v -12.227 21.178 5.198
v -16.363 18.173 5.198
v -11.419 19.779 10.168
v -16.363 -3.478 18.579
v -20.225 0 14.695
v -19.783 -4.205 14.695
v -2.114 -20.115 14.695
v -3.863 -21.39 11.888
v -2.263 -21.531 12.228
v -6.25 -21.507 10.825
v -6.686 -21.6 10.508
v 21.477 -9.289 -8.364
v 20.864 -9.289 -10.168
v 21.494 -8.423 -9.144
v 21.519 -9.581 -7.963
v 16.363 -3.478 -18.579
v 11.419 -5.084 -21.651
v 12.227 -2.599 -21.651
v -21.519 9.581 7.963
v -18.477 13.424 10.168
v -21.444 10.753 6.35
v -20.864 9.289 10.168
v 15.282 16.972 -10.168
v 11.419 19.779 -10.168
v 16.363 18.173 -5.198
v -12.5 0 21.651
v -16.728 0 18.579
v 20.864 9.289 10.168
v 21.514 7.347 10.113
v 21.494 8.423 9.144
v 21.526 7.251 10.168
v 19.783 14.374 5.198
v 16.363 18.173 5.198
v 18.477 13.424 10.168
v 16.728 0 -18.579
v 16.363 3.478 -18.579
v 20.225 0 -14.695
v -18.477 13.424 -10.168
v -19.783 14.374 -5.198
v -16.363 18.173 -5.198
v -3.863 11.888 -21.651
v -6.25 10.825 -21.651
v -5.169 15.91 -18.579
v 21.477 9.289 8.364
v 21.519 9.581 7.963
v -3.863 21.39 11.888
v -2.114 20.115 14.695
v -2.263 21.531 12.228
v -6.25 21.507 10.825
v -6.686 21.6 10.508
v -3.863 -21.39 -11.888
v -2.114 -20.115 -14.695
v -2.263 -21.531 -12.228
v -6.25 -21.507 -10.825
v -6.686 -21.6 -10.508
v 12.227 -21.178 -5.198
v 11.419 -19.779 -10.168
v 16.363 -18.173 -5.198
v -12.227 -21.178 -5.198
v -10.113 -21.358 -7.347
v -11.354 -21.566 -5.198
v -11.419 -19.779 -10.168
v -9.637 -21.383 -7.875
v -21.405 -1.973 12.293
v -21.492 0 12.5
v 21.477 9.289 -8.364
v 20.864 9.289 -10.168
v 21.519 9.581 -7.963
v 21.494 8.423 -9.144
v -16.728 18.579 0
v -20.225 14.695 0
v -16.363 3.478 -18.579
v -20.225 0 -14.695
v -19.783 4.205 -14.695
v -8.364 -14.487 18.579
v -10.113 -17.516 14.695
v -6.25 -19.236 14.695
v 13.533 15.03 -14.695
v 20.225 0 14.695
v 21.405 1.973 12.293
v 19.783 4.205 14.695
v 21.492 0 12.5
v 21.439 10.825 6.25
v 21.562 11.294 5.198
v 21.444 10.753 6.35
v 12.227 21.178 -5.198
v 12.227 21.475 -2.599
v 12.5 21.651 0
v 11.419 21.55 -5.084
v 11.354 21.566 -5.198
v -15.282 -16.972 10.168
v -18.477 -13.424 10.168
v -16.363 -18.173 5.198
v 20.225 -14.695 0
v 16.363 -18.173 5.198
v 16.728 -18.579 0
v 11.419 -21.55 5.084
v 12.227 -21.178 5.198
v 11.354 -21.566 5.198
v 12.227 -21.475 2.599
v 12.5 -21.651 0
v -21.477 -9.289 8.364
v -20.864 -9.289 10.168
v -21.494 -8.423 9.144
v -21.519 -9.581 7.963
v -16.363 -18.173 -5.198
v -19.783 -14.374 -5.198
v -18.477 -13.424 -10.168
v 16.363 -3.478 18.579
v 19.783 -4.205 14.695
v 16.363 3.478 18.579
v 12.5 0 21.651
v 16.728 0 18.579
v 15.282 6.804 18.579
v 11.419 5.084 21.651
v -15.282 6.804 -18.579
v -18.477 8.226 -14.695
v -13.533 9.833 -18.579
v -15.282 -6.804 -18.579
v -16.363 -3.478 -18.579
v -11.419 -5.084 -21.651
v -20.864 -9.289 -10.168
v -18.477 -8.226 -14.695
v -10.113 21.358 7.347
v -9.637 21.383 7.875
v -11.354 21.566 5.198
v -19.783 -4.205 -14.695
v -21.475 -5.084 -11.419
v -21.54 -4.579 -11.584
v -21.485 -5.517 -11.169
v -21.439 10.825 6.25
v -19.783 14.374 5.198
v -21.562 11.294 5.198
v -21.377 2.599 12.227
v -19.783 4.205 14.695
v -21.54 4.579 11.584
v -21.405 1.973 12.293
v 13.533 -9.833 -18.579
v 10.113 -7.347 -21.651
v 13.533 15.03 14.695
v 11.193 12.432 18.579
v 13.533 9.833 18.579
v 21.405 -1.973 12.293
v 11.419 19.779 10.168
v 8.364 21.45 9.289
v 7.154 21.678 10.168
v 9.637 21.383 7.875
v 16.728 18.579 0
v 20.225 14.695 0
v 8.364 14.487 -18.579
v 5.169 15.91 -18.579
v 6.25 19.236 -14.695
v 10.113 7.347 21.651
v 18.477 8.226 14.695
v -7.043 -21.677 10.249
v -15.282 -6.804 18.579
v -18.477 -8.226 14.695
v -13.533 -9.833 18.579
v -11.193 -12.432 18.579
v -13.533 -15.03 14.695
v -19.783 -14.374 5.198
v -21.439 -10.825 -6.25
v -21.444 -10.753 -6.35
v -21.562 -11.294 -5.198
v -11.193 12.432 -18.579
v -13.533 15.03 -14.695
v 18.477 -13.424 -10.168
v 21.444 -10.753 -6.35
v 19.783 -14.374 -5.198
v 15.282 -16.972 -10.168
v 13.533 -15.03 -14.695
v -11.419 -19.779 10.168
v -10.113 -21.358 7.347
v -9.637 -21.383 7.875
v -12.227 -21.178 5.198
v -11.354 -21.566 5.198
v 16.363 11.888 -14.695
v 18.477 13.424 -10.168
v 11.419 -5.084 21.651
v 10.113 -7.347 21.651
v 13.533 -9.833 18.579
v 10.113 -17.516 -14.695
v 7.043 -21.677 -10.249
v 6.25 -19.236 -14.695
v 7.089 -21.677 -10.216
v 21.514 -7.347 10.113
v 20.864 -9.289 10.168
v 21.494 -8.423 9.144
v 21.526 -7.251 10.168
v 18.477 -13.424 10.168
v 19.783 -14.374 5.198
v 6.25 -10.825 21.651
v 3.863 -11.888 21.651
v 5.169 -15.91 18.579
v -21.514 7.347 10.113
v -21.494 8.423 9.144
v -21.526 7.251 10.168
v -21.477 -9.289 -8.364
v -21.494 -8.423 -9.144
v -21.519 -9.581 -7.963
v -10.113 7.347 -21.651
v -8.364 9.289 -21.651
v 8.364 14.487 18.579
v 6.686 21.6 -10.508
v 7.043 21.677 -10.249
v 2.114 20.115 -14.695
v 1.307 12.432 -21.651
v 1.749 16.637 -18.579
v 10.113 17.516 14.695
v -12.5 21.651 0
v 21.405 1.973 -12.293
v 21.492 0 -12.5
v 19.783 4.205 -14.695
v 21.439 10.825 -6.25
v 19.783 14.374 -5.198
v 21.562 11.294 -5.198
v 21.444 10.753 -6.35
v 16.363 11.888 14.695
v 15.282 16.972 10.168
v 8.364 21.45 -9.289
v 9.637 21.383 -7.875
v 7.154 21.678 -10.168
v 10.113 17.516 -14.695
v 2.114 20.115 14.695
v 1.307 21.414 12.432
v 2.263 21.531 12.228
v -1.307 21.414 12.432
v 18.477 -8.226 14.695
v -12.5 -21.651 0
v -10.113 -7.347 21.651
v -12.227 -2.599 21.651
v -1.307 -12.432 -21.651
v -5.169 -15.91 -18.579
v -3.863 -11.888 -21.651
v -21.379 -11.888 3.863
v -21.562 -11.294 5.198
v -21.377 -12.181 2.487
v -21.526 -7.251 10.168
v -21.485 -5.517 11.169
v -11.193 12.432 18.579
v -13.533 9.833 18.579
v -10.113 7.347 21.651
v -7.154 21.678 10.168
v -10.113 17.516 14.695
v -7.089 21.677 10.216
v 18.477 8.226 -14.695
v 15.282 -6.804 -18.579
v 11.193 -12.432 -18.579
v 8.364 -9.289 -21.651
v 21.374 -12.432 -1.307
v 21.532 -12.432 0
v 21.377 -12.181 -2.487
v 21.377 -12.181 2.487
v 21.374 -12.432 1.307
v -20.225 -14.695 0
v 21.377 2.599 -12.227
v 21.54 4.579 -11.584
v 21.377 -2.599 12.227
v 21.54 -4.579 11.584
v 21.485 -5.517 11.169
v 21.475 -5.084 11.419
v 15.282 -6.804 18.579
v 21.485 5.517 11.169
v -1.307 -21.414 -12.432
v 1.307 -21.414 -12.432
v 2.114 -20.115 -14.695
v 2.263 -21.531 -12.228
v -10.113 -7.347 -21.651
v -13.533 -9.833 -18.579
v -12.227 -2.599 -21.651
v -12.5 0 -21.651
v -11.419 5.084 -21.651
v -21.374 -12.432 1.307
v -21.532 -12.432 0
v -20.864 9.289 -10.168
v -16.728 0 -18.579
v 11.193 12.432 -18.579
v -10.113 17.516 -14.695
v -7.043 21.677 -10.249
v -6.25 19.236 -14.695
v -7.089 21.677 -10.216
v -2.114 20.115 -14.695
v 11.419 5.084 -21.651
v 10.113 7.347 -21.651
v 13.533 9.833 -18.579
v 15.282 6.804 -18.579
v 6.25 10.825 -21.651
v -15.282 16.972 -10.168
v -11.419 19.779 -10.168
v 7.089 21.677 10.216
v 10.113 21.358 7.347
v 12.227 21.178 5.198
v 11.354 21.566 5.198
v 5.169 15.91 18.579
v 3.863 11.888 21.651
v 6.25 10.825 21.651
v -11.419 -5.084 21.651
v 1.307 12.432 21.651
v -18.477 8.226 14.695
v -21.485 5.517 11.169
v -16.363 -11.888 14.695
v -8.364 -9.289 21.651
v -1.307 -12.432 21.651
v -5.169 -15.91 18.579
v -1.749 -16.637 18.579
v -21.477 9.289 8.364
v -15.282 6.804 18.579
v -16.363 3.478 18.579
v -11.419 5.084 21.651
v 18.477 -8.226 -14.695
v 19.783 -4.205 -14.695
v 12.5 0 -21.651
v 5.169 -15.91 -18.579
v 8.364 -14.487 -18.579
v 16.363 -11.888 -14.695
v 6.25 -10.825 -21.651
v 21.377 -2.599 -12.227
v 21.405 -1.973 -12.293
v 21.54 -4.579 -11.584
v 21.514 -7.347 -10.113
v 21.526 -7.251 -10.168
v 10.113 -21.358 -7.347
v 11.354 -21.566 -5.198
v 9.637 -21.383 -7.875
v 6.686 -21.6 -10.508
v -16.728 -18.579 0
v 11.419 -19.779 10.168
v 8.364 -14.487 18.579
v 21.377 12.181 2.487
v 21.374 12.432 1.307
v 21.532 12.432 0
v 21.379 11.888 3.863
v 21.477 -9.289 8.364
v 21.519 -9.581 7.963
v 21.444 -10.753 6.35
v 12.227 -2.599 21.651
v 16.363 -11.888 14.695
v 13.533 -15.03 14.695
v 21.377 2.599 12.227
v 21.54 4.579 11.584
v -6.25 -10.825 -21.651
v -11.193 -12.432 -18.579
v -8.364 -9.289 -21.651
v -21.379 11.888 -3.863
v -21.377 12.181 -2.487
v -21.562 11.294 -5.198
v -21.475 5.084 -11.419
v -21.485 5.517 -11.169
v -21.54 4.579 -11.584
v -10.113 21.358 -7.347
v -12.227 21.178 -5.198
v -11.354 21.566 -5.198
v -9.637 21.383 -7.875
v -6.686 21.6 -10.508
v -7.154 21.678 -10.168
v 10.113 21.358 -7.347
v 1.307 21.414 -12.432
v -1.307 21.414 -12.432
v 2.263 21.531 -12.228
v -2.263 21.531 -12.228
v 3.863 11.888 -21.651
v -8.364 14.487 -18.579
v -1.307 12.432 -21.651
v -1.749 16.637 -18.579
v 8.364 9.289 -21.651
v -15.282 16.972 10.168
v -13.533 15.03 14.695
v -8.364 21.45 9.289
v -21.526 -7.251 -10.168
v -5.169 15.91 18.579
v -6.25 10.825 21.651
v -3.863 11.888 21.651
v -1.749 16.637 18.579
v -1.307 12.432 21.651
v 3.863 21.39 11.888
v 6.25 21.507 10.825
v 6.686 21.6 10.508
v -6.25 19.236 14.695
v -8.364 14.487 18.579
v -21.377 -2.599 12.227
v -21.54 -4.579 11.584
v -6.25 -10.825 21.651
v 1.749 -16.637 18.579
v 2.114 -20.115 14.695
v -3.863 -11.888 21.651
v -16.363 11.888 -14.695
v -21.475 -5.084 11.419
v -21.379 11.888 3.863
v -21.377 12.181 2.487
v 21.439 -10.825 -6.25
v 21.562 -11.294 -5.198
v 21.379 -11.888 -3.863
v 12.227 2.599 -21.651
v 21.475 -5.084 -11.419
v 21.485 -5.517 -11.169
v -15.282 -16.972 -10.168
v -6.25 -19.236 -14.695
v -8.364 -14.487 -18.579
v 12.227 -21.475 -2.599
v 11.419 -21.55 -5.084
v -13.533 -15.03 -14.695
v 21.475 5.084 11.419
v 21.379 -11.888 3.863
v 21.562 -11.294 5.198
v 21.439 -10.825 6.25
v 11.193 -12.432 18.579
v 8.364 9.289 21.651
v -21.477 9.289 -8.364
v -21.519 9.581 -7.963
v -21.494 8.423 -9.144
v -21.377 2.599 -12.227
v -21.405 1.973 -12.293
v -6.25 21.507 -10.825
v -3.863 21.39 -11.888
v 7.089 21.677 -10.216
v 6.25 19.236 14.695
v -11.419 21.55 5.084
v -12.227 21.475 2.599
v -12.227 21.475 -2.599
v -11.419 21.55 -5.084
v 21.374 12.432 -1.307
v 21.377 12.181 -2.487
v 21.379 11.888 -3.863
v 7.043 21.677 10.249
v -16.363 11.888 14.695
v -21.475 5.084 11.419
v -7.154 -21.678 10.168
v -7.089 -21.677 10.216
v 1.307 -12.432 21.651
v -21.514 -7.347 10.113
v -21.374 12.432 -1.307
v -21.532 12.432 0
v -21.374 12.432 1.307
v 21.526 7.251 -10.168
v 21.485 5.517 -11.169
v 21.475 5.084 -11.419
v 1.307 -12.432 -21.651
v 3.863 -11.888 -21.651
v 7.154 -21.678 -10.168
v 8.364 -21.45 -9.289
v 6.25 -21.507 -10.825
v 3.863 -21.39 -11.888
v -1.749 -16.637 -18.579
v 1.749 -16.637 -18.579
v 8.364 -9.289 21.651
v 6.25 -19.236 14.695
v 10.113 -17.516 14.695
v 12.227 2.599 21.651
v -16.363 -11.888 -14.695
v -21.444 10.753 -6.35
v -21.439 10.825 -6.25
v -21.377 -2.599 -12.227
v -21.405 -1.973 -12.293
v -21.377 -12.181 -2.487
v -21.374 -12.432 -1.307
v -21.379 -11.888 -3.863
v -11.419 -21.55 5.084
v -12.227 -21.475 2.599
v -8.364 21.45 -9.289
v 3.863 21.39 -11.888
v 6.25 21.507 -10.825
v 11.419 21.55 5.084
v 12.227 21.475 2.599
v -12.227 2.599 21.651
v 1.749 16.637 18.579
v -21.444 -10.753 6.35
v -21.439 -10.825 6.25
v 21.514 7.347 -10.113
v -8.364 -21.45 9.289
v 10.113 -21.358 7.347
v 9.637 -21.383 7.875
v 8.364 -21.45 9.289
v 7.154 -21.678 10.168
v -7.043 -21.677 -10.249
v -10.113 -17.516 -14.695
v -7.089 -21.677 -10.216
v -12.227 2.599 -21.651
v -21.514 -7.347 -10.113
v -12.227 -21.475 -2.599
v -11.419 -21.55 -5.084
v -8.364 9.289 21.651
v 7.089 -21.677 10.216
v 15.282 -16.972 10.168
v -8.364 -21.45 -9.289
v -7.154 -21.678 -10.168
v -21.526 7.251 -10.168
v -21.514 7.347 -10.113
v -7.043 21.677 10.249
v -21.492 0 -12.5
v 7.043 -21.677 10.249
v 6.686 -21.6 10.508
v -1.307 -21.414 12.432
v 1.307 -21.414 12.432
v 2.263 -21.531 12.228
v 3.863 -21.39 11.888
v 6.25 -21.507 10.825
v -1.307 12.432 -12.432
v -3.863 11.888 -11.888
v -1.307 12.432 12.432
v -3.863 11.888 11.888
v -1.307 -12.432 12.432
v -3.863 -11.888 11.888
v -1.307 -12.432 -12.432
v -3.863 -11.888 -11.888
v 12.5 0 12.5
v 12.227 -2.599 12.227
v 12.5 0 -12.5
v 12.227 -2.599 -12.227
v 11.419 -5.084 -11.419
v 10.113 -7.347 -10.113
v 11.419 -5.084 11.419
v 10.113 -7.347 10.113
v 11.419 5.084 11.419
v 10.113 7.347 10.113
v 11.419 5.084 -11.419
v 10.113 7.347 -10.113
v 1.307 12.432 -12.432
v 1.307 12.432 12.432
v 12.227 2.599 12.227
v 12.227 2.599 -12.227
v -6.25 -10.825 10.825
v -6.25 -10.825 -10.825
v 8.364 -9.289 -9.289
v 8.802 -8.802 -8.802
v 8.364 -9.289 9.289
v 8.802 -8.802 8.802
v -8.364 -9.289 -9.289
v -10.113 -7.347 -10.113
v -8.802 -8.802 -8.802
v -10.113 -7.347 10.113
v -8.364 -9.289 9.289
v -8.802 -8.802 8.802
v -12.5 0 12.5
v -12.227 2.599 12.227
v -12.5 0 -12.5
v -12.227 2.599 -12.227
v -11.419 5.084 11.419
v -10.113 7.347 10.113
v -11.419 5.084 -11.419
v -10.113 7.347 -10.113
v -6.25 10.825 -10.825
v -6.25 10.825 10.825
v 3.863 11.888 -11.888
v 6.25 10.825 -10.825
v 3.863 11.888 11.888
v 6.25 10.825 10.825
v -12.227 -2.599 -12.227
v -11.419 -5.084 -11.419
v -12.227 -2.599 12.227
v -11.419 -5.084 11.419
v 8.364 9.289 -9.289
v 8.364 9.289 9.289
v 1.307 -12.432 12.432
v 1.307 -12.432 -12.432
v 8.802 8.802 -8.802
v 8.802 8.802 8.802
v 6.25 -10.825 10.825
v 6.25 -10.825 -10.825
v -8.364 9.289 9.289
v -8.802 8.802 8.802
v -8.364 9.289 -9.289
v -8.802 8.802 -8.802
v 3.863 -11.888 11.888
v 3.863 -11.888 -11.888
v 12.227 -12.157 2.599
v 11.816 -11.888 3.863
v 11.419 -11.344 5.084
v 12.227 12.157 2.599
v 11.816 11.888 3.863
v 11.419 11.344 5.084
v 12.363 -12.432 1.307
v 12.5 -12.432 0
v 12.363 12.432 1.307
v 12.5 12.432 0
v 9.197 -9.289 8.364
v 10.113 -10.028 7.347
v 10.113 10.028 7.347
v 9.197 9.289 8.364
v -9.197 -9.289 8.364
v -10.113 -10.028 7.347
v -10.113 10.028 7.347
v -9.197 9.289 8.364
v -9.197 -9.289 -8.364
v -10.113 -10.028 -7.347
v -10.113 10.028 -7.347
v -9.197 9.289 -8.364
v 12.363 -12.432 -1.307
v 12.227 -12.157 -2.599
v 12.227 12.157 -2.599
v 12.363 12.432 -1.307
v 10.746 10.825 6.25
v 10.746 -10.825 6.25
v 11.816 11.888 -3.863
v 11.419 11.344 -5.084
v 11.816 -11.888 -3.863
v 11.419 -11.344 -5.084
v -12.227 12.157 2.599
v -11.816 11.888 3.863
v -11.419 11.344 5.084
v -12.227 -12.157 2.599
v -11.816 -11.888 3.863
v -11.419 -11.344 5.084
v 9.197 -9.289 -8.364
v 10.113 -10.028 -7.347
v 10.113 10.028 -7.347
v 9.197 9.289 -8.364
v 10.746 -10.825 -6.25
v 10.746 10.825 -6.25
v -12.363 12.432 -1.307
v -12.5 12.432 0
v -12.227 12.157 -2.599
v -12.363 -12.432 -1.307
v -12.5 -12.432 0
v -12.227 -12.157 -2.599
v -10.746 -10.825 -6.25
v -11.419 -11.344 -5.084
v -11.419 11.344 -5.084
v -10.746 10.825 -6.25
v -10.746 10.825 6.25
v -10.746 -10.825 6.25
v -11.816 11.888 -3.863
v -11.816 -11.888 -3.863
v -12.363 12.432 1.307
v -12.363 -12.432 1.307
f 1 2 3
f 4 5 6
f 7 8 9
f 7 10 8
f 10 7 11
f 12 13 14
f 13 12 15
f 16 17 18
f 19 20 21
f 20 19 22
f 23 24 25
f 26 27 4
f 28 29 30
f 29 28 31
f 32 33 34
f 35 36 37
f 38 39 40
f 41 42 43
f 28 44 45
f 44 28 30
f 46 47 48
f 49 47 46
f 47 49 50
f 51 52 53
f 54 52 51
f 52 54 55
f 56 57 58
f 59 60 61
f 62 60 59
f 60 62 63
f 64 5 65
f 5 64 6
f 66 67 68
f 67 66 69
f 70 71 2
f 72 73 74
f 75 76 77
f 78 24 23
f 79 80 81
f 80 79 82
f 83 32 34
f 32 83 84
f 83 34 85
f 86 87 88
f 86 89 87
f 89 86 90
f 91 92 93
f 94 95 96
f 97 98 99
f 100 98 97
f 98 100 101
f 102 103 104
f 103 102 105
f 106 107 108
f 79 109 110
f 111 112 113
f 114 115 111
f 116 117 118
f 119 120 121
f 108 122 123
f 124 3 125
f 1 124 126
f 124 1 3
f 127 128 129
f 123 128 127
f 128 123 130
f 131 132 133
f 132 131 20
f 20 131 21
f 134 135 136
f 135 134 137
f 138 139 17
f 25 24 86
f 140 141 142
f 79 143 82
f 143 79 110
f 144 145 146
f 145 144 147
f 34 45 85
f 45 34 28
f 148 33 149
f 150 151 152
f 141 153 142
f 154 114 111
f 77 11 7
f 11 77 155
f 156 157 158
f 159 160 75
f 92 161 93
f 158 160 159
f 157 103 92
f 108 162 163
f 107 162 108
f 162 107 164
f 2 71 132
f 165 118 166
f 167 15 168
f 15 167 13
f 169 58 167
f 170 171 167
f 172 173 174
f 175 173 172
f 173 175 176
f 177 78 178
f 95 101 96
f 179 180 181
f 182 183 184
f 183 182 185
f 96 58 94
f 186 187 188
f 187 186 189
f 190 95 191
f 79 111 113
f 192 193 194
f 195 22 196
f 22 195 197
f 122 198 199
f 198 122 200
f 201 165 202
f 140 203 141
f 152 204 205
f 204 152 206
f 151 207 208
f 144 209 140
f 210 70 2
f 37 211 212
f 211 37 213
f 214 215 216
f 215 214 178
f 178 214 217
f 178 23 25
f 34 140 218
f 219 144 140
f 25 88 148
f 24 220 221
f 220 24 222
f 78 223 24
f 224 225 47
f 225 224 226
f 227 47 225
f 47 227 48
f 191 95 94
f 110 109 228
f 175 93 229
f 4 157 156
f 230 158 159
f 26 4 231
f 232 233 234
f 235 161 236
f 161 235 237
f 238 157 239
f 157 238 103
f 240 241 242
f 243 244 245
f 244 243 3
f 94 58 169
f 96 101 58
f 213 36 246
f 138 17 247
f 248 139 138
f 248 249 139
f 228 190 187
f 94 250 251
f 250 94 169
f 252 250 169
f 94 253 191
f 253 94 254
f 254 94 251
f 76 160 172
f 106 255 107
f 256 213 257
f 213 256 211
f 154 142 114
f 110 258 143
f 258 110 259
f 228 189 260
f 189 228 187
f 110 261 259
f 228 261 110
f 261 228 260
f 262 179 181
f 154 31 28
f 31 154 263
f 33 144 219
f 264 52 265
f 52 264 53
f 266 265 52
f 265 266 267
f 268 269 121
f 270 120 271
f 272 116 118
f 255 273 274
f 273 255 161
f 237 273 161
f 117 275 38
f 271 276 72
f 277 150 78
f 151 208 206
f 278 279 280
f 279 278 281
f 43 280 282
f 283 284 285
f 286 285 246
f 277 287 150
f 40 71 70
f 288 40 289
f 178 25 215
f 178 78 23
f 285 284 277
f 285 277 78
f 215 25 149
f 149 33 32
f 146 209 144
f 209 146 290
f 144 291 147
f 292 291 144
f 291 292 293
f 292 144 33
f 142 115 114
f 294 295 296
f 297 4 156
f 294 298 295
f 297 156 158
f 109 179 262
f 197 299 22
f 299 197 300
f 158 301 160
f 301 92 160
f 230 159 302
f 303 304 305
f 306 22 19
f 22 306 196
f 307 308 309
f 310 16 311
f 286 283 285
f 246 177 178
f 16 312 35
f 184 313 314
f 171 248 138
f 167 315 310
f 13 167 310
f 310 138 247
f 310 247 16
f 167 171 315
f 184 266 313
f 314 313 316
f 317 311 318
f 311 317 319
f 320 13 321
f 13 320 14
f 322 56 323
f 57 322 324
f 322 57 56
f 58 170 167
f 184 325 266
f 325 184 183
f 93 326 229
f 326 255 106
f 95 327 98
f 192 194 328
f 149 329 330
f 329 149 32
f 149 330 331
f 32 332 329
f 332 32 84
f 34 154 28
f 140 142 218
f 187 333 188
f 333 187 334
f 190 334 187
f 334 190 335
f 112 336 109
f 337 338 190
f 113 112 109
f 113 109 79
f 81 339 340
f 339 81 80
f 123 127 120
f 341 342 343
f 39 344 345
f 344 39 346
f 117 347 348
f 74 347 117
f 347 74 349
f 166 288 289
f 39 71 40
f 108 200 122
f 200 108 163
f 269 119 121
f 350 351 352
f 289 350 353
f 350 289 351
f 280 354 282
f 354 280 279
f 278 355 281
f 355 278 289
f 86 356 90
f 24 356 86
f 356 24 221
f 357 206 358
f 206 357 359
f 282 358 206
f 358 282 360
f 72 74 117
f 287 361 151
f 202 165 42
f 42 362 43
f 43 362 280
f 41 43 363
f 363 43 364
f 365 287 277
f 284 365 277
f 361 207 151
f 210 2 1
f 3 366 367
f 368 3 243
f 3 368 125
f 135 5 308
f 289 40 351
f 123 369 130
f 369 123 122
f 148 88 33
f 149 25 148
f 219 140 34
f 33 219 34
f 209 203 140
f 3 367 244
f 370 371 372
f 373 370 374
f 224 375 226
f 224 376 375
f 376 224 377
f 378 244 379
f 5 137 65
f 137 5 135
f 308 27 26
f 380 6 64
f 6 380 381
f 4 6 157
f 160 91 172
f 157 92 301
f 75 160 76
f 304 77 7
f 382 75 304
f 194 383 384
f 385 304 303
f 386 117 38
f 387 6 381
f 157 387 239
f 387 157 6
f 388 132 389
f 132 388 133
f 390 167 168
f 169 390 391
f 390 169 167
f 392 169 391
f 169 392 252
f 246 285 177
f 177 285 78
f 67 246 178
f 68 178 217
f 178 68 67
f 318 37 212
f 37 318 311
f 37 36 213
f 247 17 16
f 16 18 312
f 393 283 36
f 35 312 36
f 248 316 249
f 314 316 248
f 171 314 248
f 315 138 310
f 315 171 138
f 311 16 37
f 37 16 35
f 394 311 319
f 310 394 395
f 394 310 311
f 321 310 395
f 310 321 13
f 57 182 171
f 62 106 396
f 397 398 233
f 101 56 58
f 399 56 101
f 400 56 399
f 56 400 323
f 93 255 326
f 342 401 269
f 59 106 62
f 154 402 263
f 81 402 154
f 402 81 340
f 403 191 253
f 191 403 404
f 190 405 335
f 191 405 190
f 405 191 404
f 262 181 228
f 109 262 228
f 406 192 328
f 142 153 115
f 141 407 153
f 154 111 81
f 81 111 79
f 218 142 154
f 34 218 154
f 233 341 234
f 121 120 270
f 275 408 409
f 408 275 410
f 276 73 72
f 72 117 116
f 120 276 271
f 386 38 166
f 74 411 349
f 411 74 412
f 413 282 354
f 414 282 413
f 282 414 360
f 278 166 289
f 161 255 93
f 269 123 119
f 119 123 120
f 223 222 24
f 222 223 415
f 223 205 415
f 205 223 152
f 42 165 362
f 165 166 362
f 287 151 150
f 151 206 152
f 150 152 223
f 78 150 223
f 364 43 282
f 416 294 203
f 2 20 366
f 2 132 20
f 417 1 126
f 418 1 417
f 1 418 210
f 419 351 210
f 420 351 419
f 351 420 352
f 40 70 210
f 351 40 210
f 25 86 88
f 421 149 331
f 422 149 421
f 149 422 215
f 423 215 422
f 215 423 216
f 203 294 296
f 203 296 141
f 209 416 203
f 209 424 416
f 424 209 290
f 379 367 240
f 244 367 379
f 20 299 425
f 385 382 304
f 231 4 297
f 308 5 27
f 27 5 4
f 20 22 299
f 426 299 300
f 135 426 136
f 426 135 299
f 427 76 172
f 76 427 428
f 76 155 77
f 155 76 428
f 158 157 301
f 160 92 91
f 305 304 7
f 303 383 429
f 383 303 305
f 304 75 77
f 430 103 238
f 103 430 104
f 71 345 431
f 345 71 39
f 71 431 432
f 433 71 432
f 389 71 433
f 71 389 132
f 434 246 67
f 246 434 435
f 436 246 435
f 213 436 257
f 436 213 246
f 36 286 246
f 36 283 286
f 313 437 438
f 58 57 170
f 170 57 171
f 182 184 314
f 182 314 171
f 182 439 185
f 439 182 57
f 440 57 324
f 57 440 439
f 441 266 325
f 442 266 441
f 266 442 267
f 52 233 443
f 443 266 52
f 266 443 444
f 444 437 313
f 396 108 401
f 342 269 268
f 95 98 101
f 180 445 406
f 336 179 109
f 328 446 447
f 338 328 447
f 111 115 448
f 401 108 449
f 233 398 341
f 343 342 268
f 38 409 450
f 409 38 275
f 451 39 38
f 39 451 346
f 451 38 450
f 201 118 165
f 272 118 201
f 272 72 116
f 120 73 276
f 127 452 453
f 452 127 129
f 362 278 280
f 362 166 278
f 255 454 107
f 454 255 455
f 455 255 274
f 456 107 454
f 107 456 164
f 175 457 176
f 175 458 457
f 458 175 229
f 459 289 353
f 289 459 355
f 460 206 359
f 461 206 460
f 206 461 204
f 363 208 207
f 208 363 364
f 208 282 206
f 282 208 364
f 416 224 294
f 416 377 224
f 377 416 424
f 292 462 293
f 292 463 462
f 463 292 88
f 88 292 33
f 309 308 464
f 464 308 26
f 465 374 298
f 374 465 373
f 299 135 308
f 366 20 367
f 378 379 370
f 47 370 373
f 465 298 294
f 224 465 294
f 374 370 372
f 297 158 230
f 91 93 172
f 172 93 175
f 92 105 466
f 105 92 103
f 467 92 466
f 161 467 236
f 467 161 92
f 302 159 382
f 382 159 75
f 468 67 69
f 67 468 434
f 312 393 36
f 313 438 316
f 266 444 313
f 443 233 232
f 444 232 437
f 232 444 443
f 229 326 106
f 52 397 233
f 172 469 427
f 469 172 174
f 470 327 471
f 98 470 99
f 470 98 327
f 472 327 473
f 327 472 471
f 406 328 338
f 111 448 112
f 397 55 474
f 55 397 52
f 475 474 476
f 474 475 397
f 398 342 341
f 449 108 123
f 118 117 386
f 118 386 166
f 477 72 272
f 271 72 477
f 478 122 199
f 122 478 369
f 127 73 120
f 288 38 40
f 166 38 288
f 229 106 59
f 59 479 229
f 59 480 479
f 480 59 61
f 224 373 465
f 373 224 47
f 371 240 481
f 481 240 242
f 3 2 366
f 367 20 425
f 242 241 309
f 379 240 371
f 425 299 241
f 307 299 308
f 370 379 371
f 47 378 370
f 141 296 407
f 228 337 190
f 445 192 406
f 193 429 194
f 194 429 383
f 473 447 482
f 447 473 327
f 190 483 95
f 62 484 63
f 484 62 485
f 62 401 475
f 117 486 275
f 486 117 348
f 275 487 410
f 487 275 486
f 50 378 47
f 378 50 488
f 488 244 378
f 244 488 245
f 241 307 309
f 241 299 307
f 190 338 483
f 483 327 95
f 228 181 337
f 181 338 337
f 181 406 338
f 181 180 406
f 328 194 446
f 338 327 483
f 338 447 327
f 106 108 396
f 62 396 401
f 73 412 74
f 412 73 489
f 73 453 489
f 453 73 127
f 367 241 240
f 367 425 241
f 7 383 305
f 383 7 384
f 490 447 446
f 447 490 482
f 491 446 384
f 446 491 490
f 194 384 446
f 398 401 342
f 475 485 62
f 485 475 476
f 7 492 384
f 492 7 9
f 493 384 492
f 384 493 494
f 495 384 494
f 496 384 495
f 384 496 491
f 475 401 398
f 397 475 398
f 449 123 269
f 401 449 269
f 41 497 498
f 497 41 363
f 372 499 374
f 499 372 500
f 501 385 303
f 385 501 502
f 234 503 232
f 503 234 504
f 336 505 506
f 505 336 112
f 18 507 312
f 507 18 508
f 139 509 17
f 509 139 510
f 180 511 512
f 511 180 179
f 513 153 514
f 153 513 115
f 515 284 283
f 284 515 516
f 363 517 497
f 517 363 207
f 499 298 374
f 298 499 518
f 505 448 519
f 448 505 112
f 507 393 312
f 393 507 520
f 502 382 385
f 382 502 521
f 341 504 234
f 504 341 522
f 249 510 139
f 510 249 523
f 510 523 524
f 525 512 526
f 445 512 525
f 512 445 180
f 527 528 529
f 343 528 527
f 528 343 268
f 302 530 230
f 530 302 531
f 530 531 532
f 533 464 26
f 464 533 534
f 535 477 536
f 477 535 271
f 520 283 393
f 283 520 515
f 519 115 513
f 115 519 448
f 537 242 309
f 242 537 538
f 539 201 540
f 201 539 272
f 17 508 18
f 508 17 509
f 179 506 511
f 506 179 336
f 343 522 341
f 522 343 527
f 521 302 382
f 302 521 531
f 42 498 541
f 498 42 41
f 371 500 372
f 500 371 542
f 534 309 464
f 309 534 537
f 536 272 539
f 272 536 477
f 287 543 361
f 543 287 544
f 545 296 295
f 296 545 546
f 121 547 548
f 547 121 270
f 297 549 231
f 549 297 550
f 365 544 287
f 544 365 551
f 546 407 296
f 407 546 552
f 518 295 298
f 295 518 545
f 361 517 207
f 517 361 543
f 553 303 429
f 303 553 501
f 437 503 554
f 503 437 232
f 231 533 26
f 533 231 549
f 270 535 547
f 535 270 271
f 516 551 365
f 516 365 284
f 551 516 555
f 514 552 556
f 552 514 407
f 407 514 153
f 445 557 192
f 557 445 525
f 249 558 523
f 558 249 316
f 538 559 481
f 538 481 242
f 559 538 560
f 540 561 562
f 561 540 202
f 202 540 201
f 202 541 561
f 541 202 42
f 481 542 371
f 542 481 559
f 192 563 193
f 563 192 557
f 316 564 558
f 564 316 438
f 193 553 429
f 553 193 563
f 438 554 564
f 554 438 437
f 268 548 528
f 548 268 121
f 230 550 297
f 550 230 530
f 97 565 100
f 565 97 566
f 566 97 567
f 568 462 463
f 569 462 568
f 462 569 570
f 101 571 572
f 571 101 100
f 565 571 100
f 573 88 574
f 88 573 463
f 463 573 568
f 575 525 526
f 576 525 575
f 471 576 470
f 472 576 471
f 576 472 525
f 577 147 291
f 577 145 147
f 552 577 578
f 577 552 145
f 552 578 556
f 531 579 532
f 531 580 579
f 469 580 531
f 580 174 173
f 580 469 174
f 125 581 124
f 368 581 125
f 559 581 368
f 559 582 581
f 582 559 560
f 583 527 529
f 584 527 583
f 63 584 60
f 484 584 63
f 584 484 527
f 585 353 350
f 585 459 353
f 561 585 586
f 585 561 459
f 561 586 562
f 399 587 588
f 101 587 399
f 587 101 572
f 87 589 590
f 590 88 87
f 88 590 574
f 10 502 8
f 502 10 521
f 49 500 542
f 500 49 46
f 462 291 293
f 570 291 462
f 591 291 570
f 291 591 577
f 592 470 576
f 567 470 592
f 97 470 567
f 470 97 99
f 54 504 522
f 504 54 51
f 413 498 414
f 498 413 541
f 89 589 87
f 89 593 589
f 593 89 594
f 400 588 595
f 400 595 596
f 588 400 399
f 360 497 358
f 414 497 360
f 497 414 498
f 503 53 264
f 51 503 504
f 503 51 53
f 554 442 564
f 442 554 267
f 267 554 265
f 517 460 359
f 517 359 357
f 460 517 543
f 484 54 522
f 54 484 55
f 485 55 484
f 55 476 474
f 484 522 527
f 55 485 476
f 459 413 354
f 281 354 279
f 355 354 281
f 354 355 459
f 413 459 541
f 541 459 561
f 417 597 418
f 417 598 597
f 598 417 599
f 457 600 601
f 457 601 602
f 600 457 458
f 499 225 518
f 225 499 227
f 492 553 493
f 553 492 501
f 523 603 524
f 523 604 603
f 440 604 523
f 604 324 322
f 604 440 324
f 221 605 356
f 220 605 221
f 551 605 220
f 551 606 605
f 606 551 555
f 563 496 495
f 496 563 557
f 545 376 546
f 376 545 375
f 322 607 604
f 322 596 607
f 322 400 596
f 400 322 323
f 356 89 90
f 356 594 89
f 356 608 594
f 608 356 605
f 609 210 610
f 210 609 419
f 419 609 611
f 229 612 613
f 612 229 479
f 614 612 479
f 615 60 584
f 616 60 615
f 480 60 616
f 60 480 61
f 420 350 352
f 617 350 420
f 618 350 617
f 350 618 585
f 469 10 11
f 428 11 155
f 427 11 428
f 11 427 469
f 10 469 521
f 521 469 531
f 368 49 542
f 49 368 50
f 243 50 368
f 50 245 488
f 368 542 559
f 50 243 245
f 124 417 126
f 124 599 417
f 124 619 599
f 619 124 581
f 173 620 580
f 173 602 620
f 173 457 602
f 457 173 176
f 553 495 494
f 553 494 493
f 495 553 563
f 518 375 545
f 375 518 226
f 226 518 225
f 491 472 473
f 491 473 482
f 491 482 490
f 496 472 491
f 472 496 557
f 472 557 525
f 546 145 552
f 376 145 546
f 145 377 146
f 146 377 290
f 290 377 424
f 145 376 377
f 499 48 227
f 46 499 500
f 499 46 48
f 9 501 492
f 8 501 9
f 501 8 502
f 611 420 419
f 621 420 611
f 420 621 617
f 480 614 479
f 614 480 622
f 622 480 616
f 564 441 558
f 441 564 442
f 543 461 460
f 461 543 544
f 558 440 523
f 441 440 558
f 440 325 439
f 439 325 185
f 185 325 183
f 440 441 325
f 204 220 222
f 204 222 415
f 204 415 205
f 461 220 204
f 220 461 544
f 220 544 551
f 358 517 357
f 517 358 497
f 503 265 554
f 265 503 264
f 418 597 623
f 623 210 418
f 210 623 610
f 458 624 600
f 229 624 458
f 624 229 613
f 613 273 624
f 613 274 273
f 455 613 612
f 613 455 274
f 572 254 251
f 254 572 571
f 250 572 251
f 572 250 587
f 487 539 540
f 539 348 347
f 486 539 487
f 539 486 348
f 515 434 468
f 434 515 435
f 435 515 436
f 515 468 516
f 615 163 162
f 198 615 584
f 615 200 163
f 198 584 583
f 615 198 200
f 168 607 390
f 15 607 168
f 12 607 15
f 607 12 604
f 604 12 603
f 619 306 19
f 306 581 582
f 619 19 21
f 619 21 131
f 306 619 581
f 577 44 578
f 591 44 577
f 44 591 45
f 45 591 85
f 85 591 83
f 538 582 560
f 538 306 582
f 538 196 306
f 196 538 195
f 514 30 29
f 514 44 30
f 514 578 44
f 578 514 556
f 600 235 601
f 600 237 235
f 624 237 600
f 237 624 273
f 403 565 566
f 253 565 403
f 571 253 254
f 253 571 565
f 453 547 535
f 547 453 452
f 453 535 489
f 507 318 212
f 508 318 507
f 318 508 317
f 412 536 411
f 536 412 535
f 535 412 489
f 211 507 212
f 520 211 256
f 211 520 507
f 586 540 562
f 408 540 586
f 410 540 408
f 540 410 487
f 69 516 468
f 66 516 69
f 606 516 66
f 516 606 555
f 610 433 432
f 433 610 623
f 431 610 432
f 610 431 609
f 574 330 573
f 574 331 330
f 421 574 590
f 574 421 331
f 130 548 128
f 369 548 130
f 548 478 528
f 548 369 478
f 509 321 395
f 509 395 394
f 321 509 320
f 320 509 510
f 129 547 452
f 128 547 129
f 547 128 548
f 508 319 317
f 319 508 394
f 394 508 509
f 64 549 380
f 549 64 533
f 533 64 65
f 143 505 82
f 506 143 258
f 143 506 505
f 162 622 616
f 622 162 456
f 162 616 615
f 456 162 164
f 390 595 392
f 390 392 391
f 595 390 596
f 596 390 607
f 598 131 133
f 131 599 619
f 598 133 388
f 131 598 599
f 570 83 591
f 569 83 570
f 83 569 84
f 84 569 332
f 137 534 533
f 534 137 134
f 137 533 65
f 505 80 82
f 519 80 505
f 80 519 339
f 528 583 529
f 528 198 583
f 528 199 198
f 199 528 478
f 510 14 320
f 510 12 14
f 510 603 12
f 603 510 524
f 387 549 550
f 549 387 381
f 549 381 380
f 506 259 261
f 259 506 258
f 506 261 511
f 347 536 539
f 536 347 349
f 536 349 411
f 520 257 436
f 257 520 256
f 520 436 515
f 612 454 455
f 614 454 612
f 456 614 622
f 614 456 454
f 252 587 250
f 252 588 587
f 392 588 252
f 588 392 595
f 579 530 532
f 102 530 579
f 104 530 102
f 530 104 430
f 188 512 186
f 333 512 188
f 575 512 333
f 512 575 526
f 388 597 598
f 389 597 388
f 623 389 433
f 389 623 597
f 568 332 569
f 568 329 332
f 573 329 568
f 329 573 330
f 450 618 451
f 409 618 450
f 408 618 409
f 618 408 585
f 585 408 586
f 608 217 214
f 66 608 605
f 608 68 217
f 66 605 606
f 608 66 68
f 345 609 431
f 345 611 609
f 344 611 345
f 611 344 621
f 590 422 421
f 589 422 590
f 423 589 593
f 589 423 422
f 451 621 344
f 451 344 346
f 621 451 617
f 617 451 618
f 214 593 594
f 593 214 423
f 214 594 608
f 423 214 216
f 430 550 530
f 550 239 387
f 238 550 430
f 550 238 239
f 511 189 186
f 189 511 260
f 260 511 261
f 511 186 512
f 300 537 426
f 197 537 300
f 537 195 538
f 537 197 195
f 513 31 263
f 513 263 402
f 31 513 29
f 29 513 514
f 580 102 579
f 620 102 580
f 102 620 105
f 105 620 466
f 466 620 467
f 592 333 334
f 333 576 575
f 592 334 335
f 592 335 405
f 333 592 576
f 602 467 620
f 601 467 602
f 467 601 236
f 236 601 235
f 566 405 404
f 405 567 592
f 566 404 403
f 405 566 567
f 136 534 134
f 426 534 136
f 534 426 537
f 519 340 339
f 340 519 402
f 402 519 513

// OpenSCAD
module example001()
{
	function r_from_dia(d) = d / 2;

	module rotcy(rot, r, h) {
		rotate(90, rot)
			cylinder(r = r, h = h, center = true);
	}

	difference() {
		sphere(r = r_from_dia(size));
		rotcy([0, 0, 0], cy_r, cy_h);
		rotcy([1, 0, 0], cy_r, cy_h);
		rotcy([0, 1, 0], cy_r, cy_h);
	}

	size = 50;
	hole = 25;

	cy_r = r_from_dia(hole);
	cy_h = r_from_dia(size * 2.5);
}

echo(version=version());

example001();

// Written by Clifford Wolf <clifford@clifford.at> and Marius
// Kintel <marius@kintel.net>
//
// To the extent possible under law, the author(s) have dedicated all
// copyright and related and neighboring rights to this software to the
// public domain worldwide. This software is distributed without any
// warranty.
//
// You should have received a copy of the CC0 Public Domain
// Dedication along with this software.
// If not, see <http://creativecommons.org/publicdomain/zero/1.0/>.
